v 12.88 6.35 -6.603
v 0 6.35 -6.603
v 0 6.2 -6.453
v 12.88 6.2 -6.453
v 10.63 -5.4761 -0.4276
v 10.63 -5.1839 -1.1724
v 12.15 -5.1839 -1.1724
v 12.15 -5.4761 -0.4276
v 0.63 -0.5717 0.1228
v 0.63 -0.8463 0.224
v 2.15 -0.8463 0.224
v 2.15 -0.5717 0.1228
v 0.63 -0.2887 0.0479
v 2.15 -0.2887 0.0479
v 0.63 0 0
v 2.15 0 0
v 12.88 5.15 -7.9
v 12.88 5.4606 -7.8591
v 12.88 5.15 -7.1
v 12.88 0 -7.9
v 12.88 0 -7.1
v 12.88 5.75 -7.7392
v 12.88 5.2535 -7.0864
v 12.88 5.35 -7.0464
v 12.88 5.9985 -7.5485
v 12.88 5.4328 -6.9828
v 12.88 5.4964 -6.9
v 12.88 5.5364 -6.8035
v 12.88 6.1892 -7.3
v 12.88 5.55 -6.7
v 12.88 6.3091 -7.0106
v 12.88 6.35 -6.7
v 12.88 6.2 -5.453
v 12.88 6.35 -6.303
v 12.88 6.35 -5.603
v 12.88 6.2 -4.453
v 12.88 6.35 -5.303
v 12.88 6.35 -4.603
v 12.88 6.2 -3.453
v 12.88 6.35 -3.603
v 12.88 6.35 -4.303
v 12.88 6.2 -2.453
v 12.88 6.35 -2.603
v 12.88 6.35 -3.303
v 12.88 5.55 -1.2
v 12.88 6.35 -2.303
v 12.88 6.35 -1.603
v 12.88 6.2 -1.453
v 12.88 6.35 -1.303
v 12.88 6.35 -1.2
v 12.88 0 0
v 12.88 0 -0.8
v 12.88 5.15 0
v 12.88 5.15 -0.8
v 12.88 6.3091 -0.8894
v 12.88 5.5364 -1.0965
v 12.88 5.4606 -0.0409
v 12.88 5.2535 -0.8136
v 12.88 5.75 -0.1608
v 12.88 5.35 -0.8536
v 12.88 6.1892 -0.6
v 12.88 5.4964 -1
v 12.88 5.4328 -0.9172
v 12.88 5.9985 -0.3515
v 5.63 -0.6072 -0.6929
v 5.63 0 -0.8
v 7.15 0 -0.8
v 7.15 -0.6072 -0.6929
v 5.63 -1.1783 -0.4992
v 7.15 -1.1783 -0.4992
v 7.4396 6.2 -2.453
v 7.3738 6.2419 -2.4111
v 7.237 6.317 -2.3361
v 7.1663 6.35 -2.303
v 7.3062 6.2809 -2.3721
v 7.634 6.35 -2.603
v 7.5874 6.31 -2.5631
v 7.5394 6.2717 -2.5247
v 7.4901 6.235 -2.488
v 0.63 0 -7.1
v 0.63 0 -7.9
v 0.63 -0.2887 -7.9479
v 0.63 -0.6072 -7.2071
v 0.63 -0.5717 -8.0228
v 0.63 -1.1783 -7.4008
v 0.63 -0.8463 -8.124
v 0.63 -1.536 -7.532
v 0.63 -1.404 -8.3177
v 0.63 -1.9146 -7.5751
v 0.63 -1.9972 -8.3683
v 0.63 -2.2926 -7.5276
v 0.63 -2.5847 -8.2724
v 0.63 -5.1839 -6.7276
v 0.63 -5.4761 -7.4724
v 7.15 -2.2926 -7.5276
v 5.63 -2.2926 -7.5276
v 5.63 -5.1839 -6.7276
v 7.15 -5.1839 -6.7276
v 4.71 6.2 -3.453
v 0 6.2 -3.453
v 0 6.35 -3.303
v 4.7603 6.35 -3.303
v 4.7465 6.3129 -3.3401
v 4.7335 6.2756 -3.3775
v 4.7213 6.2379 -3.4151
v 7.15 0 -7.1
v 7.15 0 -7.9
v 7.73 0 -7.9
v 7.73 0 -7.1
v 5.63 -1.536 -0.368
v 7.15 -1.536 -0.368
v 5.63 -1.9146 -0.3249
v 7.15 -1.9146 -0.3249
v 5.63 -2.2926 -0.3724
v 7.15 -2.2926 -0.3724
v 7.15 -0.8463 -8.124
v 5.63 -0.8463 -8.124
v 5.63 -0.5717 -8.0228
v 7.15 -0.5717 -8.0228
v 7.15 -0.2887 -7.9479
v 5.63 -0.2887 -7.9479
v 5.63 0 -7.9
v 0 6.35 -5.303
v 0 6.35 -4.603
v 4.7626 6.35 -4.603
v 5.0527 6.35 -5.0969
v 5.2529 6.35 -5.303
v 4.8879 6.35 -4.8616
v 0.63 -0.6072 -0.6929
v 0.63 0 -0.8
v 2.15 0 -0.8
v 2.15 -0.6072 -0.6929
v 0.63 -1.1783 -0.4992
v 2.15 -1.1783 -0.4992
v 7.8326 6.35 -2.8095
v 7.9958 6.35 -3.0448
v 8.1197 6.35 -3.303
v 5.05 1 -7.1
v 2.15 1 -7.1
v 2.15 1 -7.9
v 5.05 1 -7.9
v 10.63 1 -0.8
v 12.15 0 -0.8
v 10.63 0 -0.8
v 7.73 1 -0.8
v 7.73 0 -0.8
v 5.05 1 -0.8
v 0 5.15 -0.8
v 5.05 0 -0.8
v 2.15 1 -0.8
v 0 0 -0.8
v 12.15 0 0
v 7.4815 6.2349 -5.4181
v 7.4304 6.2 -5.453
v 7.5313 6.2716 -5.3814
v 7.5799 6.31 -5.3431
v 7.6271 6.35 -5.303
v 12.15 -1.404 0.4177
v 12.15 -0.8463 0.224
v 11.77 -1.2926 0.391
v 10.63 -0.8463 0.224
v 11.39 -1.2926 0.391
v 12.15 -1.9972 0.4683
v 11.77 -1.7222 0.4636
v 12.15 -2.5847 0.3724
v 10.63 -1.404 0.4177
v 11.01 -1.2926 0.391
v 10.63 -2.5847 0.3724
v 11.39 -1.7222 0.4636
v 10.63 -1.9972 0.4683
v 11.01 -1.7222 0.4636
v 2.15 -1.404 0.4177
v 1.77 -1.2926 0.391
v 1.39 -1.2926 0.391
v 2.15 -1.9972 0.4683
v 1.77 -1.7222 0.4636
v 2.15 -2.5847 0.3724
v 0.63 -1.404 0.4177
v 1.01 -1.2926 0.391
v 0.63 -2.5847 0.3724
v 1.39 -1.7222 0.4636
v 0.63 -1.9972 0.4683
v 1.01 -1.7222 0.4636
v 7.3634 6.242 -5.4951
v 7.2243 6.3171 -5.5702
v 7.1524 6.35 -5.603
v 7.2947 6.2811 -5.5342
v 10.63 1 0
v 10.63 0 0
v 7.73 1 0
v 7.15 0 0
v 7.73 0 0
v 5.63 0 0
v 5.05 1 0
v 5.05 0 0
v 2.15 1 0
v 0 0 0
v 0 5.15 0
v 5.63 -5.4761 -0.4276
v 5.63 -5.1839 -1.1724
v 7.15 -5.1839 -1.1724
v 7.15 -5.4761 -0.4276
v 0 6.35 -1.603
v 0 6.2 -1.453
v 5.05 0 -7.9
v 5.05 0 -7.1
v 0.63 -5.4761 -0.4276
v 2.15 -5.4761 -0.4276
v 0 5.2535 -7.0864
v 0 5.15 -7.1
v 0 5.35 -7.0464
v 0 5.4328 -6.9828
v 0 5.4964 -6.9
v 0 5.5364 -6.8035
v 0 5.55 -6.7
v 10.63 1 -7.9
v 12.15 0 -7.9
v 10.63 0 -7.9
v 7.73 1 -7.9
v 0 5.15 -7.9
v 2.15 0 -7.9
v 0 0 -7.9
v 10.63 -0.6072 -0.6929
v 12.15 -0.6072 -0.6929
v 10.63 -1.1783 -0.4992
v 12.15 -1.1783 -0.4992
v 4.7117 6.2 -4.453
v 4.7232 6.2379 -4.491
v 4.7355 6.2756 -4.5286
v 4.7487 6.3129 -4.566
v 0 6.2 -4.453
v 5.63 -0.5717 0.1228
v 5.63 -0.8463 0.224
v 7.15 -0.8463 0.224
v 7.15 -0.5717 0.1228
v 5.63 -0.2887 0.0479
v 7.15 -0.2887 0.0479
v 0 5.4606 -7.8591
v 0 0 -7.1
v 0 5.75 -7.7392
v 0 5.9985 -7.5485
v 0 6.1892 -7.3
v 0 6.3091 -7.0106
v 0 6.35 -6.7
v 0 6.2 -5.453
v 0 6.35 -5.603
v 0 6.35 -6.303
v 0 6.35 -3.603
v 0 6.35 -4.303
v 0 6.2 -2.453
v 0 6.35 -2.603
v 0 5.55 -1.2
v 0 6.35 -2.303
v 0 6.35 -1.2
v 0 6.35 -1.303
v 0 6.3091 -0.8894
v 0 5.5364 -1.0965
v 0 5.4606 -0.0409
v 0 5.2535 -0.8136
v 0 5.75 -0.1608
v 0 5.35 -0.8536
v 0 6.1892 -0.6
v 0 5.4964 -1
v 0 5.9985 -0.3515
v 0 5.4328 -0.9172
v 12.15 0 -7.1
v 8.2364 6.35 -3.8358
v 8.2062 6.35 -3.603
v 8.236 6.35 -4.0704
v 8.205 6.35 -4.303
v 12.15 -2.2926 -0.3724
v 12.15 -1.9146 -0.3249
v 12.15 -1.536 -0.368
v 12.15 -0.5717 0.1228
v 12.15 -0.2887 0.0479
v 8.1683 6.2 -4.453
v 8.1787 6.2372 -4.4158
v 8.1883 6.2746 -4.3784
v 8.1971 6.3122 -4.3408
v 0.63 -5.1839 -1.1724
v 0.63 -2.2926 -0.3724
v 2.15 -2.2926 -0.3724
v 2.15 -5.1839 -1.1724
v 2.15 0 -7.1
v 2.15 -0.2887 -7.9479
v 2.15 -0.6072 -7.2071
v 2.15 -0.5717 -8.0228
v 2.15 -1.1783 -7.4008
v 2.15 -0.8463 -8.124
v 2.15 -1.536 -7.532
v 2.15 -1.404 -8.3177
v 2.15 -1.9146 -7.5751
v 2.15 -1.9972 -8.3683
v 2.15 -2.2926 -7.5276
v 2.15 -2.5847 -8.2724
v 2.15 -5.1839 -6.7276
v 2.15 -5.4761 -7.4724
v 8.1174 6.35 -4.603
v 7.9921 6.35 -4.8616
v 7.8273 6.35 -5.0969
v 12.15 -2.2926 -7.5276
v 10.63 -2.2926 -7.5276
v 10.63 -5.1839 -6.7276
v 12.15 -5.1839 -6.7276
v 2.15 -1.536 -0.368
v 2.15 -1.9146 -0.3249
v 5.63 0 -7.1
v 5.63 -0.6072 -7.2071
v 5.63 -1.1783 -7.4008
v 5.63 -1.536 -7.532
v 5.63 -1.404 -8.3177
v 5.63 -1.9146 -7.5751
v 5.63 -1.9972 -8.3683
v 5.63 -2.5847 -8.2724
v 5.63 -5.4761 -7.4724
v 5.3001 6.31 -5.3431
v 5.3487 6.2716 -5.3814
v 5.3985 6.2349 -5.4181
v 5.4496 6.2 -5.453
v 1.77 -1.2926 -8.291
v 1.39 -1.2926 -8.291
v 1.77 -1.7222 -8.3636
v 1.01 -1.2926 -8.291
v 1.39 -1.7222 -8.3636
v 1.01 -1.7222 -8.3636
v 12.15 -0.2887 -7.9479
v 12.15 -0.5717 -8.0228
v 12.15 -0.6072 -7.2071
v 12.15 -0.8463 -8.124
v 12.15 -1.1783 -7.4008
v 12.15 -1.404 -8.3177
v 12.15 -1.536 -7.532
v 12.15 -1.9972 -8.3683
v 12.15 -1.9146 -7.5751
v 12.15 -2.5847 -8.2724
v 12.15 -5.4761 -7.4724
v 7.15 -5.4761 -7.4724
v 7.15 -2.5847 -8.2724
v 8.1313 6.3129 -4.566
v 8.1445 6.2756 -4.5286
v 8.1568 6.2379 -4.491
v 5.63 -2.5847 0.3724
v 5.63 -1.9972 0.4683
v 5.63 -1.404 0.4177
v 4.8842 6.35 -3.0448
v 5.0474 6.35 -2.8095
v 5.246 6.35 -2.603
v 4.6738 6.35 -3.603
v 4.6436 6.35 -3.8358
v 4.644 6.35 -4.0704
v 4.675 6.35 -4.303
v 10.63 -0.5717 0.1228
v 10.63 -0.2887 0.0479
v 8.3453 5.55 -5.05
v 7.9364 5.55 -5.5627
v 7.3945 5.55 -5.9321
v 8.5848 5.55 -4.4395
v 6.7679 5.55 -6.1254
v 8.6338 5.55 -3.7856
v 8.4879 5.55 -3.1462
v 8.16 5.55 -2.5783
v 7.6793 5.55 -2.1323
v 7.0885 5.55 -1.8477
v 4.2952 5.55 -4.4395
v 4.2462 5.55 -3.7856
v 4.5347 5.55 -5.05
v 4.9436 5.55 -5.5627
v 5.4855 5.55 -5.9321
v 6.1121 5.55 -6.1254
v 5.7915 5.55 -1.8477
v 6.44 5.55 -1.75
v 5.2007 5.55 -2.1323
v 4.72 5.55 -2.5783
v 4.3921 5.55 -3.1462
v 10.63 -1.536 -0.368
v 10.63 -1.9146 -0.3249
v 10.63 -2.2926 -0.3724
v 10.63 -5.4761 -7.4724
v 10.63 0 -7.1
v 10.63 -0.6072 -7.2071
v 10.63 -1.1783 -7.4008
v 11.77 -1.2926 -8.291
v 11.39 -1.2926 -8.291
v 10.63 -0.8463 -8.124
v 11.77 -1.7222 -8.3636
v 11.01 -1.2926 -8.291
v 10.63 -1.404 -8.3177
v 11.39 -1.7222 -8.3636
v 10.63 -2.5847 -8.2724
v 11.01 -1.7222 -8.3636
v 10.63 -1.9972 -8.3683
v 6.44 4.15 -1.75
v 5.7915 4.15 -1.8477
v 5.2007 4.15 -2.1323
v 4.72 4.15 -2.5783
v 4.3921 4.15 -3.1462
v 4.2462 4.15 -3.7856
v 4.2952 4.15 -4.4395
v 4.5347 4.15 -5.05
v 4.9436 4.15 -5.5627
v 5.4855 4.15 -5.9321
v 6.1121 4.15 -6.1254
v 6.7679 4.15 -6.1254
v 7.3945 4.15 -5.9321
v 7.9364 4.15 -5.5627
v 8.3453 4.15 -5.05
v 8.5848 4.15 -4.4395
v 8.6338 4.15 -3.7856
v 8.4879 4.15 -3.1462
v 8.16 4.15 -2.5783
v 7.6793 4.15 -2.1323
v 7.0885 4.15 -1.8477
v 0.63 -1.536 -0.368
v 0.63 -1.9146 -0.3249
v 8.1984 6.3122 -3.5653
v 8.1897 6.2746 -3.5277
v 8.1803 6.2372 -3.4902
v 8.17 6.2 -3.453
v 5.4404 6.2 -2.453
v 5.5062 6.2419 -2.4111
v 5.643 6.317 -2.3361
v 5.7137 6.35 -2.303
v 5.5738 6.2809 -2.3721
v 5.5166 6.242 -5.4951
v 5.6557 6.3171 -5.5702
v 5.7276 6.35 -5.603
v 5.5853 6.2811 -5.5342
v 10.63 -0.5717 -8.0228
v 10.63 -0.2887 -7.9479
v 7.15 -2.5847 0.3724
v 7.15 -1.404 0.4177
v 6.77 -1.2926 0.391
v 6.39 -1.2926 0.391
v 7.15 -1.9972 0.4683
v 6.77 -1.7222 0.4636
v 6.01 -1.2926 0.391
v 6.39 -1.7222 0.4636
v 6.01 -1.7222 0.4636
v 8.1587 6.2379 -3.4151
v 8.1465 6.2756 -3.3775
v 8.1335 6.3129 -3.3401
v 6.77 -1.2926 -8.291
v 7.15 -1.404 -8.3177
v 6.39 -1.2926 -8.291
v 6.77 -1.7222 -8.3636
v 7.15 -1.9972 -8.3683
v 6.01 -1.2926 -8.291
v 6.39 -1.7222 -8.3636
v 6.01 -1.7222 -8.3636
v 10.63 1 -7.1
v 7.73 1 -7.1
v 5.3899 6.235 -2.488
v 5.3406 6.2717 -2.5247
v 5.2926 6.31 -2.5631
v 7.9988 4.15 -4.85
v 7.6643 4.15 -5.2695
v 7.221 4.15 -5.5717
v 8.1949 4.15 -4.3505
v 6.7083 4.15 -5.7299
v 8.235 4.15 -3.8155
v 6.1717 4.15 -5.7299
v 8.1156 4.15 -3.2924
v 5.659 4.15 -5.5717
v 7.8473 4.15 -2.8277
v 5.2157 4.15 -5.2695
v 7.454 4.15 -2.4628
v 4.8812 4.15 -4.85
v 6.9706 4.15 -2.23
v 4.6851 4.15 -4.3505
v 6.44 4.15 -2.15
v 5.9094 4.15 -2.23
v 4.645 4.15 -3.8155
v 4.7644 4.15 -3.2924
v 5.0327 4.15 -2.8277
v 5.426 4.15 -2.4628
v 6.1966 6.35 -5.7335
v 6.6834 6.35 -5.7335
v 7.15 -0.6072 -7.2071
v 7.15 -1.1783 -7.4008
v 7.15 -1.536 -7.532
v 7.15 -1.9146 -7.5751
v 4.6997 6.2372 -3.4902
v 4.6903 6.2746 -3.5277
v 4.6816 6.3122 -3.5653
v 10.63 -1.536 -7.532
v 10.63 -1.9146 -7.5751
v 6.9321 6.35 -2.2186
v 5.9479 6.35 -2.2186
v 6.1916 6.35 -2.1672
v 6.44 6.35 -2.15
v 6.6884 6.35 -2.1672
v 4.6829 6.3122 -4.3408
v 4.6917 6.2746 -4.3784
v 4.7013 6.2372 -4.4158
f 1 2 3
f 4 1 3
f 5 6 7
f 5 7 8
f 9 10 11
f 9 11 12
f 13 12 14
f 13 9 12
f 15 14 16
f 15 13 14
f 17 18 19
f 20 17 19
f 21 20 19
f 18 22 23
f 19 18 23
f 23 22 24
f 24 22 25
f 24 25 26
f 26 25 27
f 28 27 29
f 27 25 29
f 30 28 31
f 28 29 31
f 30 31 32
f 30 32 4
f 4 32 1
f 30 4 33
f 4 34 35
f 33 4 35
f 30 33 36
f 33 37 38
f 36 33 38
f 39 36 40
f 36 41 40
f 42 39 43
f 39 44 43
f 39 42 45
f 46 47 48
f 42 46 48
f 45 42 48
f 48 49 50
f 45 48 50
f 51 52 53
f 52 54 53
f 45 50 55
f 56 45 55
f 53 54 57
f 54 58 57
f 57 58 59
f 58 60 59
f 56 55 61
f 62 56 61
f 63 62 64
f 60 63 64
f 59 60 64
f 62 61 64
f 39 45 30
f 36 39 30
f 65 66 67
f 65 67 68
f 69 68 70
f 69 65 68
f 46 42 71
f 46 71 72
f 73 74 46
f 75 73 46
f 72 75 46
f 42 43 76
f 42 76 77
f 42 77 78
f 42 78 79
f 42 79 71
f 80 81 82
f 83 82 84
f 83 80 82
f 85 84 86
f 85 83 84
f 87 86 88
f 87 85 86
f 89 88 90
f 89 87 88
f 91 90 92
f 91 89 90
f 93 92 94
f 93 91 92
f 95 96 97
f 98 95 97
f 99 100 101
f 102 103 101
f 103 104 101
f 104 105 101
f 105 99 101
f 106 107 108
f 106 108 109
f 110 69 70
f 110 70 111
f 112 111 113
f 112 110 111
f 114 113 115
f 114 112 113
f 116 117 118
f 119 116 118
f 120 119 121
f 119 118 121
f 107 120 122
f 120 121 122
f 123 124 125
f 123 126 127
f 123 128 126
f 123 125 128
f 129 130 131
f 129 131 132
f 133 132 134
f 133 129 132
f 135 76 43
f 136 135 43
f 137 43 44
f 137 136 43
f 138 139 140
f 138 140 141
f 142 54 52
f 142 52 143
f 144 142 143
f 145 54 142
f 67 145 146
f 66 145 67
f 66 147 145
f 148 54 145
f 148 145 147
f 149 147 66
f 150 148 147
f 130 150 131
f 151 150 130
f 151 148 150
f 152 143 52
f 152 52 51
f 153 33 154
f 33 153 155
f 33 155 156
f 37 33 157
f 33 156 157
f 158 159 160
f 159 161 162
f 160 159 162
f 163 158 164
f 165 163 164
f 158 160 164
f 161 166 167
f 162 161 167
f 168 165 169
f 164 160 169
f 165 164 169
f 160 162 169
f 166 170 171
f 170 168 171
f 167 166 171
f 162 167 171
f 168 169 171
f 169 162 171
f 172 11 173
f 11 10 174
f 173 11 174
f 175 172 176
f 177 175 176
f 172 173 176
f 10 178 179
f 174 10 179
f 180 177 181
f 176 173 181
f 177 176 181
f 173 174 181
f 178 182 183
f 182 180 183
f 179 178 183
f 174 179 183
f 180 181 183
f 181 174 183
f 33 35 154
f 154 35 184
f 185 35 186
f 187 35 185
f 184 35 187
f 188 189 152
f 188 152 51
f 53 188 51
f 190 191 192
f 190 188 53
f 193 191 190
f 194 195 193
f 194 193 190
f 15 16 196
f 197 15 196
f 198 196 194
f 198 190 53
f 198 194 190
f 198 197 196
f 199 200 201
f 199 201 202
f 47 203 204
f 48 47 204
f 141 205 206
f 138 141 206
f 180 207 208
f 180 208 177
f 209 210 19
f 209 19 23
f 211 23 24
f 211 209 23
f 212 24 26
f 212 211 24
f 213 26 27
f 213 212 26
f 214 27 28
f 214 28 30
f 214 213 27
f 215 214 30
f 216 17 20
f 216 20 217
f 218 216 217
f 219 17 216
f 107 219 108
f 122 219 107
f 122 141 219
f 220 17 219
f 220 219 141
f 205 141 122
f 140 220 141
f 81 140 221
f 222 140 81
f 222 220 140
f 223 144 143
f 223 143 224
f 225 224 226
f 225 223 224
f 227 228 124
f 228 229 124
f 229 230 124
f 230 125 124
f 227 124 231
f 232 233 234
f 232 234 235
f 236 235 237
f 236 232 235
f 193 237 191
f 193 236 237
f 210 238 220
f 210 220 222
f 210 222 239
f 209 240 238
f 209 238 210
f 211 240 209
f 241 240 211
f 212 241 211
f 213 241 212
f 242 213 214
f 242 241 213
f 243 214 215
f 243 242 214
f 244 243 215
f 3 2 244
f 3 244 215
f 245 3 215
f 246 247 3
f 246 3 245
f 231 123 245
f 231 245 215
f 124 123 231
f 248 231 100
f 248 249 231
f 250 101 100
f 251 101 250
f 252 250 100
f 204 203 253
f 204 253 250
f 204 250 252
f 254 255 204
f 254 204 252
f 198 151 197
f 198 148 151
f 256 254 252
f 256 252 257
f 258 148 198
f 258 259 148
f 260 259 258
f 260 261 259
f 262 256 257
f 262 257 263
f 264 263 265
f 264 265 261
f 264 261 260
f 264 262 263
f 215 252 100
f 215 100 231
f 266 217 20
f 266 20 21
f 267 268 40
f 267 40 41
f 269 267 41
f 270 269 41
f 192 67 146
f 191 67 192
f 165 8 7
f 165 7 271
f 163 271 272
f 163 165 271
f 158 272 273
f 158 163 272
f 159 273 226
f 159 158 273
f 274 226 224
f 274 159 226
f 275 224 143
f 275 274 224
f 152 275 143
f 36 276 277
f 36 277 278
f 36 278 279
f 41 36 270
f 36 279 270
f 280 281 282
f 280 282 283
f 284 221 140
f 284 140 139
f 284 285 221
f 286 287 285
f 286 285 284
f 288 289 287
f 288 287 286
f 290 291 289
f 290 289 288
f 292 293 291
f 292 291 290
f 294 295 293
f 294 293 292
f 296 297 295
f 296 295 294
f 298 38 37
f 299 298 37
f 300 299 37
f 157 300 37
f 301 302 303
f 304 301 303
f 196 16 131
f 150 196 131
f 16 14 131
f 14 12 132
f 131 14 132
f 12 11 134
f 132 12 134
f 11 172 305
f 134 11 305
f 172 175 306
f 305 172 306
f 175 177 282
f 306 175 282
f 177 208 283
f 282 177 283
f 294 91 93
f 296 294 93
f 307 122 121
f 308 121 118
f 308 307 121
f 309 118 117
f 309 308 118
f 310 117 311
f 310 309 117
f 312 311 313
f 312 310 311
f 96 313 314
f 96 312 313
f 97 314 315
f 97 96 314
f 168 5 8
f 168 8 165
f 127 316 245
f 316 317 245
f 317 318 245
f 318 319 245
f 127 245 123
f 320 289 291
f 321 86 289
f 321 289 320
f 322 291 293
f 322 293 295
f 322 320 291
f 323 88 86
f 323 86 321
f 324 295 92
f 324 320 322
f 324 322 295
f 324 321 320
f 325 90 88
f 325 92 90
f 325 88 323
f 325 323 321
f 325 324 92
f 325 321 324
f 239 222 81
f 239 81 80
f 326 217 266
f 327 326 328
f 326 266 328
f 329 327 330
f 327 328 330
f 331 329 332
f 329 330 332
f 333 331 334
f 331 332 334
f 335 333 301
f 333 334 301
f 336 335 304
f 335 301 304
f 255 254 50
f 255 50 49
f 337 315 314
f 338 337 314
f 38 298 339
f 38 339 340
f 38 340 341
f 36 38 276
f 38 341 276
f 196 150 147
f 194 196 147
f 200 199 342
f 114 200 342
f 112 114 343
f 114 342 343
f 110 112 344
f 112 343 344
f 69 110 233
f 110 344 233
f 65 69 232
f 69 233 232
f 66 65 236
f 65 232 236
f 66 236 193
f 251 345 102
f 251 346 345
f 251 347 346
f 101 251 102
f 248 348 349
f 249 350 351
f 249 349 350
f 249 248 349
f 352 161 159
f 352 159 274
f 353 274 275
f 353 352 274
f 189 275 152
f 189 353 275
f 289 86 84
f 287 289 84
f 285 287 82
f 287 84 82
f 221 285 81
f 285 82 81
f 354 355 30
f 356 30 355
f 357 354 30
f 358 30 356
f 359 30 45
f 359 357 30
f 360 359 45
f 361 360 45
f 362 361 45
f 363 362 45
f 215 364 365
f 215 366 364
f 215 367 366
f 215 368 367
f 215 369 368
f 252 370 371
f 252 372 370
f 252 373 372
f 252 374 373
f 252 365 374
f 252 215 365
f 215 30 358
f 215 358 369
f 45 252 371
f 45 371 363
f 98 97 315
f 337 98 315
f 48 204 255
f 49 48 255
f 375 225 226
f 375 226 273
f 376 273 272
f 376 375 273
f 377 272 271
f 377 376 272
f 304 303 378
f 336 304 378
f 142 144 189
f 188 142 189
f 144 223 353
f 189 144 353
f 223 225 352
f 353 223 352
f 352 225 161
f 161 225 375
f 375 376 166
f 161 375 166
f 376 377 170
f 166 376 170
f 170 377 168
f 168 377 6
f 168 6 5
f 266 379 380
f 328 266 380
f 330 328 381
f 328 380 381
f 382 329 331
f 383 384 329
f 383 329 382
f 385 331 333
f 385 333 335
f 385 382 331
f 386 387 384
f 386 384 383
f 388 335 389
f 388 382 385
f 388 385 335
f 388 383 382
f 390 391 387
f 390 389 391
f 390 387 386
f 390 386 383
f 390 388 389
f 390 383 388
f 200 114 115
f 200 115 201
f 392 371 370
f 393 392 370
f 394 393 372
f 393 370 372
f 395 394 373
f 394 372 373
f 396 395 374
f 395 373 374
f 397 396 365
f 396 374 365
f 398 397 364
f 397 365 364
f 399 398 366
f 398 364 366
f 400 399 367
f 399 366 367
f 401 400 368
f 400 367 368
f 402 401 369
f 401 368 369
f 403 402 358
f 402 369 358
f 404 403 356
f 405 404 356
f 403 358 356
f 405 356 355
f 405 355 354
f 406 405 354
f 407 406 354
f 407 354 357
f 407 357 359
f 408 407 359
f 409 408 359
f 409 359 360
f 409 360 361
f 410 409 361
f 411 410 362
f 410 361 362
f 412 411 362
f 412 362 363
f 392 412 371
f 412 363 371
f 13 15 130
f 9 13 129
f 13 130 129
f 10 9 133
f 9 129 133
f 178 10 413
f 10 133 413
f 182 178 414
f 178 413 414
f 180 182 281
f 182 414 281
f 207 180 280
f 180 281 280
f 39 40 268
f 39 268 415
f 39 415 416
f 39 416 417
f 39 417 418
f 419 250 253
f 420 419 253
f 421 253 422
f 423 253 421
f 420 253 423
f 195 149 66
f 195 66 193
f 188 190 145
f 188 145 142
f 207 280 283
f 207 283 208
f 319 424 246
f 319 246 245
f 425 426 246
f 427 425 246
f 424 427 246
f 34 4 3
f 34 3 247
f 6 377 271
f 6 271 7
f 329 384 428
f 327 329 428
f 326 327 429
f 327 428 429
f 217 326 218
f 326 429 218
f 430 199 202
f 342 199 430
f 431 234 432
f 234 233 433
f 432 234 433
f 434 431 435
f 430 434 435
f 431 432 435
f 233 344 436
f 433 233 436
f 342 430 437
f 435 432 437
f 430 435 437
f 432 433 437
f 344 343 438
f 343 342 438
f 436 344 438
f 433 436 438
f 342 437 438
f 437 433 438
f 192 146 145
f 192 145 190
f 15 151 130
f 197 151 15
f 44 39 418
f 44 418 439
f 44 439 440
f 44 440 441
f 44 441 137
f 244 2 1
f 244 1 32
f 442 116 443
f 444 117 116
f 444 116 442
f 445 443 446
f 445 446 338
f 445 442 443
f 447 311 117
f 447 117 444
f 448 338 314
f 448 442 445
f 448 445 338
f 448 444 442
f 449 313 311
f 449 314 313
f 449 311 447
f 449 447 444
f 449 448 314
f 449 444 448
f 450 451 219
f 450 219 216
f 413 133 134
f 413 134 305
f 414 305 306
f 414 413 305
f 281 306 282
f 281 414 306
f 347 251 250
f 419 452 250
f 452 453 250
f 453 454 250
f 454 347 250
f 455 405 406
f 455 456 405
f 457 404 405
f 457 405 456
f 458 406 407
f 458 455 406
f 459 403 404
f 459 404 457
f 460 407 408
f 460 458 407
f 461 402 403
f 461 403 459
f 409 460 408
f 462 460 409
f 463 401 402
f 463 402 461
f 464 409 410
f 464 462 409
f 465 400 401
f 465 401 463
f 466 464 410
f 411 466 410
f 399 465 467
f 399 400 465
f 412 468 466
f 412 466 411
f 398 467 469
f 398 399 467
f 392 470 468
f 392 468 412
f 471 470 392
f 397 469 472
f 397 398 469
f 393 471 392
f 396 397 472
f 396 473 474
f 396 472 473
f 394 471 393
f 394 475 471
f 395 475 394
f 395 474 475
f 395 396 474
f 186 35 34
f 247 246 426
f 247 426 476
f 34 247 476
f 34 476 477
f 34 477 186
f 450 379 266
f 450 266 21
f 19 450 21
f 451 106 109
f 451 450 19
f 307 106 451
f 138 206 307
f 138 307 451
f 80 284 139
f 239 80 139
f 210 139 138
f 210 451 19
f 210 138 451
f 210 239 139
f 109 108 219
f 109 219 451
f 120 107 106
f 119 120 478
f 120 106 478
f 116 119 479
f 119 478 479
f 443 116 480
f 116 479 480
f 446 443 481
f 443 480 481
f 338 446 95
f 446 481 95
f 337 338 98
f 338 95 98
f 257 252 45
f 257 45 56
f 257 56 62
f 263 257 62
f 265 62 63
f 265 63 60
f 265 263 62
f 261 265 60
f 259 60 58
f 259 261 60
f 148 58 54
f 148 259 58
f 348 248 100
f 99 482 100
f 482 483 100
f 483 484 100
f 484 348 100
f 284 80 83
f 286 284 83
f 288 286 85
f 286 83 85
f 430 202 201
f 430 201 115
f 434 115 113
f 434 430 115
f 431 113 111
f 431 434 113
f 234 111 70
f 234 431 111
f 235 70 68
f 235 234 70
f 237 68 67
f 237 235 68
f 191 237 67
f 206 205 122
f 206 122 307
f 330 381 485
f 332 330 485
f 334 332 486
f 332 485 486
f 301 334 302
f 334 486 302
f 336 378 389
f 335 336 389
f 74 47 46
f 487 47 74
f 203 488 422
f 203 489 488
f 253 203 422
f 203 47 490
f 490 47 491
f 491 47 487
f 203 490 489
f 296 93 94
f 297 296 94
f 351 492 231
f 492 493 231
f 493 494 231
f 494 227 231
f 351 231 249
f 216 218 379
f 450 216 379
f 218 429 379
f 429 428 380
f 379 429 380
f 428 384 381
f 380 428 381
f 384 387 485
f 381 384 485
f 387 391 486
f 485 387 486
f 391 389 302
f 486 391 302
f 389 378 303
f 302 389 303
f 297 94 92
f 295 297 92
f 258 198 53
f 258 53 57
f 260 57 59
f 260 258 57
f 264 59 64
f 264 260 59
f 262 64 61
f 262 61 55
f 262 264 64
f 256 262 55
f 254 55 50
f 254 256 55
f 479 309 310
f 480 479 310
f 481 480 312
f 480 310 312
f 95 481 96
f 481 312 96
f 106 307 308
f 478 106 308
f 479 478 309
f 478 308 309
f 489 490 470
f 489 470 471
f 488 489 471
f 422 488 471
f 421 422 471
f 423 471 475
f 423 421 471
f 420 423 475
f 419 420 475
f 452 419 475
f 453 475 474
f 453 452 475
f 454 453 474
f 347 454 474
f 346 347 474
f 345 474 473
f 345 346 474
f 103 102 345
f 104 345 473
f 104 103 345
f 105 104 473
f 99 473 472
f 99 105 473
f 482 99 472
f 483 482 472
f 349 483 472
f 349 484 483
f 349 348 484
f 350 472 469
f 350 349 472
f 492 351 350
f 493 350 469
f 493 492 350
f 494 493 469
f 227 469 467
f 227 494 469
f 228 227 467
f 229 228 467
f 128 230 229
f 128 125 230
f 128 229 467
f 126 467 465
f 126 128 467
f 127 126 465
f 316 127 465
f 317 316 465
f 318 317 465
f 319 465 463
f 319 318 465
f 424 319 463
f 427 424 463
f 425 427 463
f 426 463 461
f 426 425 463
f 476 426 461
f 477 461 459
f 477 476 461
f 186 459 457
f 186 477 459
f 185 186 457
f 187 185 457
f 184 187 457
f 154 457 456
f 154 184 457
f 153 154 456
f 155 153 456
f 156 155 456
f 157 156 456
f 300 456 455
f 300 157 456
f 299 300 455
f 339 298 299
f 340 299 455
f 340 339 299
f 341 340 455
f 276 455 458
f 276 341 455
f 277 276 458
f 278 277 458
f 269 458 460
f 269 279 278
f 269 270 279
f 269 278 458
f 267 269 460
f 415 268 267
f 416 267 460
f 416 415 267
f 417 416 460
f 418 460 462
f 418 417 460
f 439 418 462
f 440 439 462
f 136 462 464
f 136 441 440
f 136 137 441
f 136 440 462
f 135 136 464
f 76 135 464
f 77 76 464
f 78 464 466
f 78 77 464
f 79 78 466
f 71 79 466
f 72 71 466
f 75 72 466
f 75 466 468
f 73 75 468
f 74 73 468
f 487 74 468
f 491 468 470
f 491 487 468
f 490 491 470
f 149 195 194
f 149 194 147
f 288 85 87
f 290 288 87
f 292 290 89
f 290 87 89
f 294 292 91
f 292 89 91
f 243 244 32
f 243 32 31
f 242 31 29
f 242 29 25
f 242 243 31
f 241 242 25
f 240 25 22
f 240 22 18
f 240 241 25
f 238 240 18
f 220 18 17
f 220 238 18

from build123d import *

# Parameters (mm, degrees)
BOSS_EXTRUDE1_DEPTH     = 12.88
SWEEP1_START            = 0.63
SWEEP1_DEPTH            = 1.52
LPATTERN1_COUNT         = 3
LPATTERN1_PITCH         = 5
SKETCH5_W               = 2.9
SKETCH5_H               = 0.8
CUT_EXTRUDE1_DEPTH      = 1
LPATTERN2_COUNT         = 2
LPATTERN2_PITCH         = 5.58
MIRROR1_START           = 0.63
MIRROR1_COPY_1_DEPTH    = 1.52
MIRROR1_COPY_2_DEPTH    = 1.52
MIRROR1_COPY_3_SKETCH_W = 2.9
MIRROR1_COPY_3_SKETCH_H = 0.8
MIRROR1_COPY_3_DEPTH    = 1
CUT_EXTRUDE2_REACH      = 21.386
SKETCH6_R               = 1.8
SKETCH7_R               = 2.2
SKETCH7_R_2             = 1.8
BOSS_EXTRUDE2_DEPTH     = 1.4
CUT_EXTRUDE3_DEPTH      = 17.621667755


# Read off the part's stored shape, not the designer's step: Sweep1
with BuildPart() as part:
    # Sketch1 → Boss-Extrude1 (new body)
    with BuildSketch(Plane(origin=(0, 0, 0), x_dir=(0, 0, -1), z_dir=(1, 0, 0))):
        with BuildLine():
            Line((0, 0), (0, 5.15))
            ThreePointArc((0, 5.15), (0.351471863, 5.998528137), (1.2, 6.35))
            Line((1.2, 6.35), (6.7, 6.35))
            ThreePointArc((6.7, 6.35), (7.548528137, 5.998528137), (7.9, 5.15))
            Line((7.9, 5.15), (7.9, 0))
            Line((7.9, 0), (7.1, 0))
            Line((7.1, 0), (7.1, 5.15))
            ThreePointArc((7.1, 5.15), (6.982842712, 5.432842712), (6.7, 5.55))
            Line((6.7, 5.55), (1.2, 5.55))
            ThreePointArc((1.2, 5.55), (0.917157288, 5.432842712), (0.8, 5.15))
            Line((0.8, 5.15), (0.8, 0))
            Line((0.8, 0), (0, 0))
        make_face()
    extrude(amount=BOSS_EXTRUDE1_DEPTH)

    # Sweep1 outline → Sweep1 (add)
    with BuildSketch(Plane.YZ.offset(SWEEP1_START)):
        with BuildLine():
            add(Edge.make_bspline(
                [(-0.846283759, -8.124029358), (-0.858016898, -8.129757785), (-0.870152204, -8.135642842), (-1.003345202, -8.19967658), (-1.15196737, -8.253874655), (-1.433217357, -8.328196696), (-1.577221625, -8.352525408), (-2.012213537, -8.385830326), (-2.305250753, -8.352541538), (-2.584692284, -8.272379972)],
                knots=[-0.008659355, -0.008659355, -0.008659355, -0.008659355, 0, 0, 0.081660017, 0.081660017, 0.163320034, 0.163320034, 0.326640068, 0.326640068, 0.326640068, 0.326640068], degree=3))
            ThreePointArc((-0.846283759, -8.124029358), (-0.431086788, -7.982015265), (0, -7.9))
            Line((0, -7.9), (0, -7.1))
            add(Edge.make_bspline(
                [(0, -7.1), (-0.377073857, -7.135252748), (-0.796992874, -7.239007705), (-1.153651992, -7.390208706), (-1.166116228, -7.395524363), (-1.178338095, -7.400759688)],
                knots=[0, 0, 0, 0, 1, 1, 1.037382886, 1.037382886, 1.037382886, 1.037382886], degree=3))
            ThreePointArc((-1.178338095, -7.400759688), (-1.724000867, -7.564826814), (-2.292574798, -7.527620028))
            Line((-2.292574798, -7.527620028), (-5.183941257, -6.727620028))
            Line((-5.183941257, -6.727620028), (-5.476058743, -7.472379972))
            Line((-5.476058743, -7.472379972), (-2.584692284, -8.272379972))
        make_face()
    sweep1 = extrude(amount=SWEEP1_DEPTH)

    # LPattern1: Sweep1 ×3
    with Locations(*[(i * LPATTERN1_PITCH, 0, 0) for i in range(1, LPATTERN1_COUNT)]):
        add(sweep1)

    # Sketch5 → Cut-Extrude1 (cut)
    with BuildSketch(Plane.XZ):
        with Locations((3.6, -7.5)):
            Rectangle(SKETCH5_W, SKETCH5_H)
    cut_extrude1 = extrude(amount=-CUT_EXTRUDE1_DEPTH, mode=Mode.SUBTRACT)

    # LPattern2: Cut-Extrude1 ×2
    with Locations(*[(i * LPATTERN2_PITCH, 0, 0) for i in range(1, LPATTERN2_COUNT)]):
        add(cut_extrude1, mode=Mode.SUBTRACT)

    # Mirror1: Sweep1, Cut-Extrude1 across plane
    add(sweep1.mirror(Plane(origin=(0, 0, -3.95), x_dir=(1, 0, 0), z_dir=(0, 0, -1))))
    add(cut_extrude1.mirror(Plane(origin=(0, 0, -3.95), x_dir=(1, 0, 0), z_dir=(0, 0, -1))), mode=Mode.SUBTRACT)

    # Mirror1 copy 1 sketch → Mirror1 copy 1 (add)
    with BuildSketch(Plane(origin=(5, 0, -7.9), x_dir=(0, 1, 0), z_dir=(1, 0, 0)).offset(MIRROR1_START)):
        with BuildLine():
            add(Edge.make_bspline(
                [(-0.846283759, 8.124029358), (-0.858016898, 8.129757785), (-0.870152204, 8.135642842), (-1.003345202, 8.19967658), (-1.15196737, 8.253874655), (-1.433217357, 8.328196696), (-1.577221625, 8.352525408), (-2.012213537, 8.385830326), (-2.305250753, 8.352541538), (-2.584692284, 8.272379972)],
                knots=[-0.008659355, -0.008659355, -0.008659355, -0.008659355, 0, 0, 0.081660017, 0.081660017, 0.163320034, 0.163320034, 0.326640068, 0.326640068, 0.326640068, 0.326640068], degree=3))
            ThreePointArc((-0.846283759, 8.124029358), (-0.431086788, 7.982015265), (0, 7.9))
            Line((0, 7.9), (0, 7.1))
            add(Edge.make_bspline(
                [(0, 7.1), (-0.377073857, 7.135252748), (-0.796992874, 7.239007705), (-1.153651992, 7.390208706), (-1.166116228, 7.395524363), (-1.178338095, 7.400759688)],
                knots=[0, 0, 0, 0, 1, 1, 1.037382886, 1.037382886, 1.037382886, 1.037382886], degree=3))
            ThreePointArc((-1.178338095, 7.400759688), (-1.724000867, 7.564826814), (-2.292574798, 7.527620028))
            Line((-2.292574798, 7.527620028), (-5.183941257, 6.727620028))
            Line((-5.183941257, 6.727620028), (-5.476058743, 7.472379972))
            Line((-5.476058743, 7.472379972), (-2.584692284, 8.272379972))
        make_face()
    extrude(amount=MIRROR1_COPY_1_DEPTH)

    # Mirror1 copy 2 sketch → Mirror1 copy 2 (add)
    with BuildSketch(Plane(origin=(10, 0, -7.9), x_dir=(0, 1, 0), z_dir=(1, 0, 0)).offset(MIRROR1_START)):
        with BuildLine():
            add(Edge.make_bspline(
                [(-0.846283759, 8.124029358), (-0.858016898, 8.129757785), (-0.870152204, 8.135642842), (-1.003345202, 8.19967658), (-1.15196737, 8.253874655), (-1.433217357, 8.328196696), (-1.577221625, 8.352525408), (-2.012213537, 8.385830326), (-2.305250753, 8.352541538), (-2.584692284, 8.272379972)],
                knots=[-0.008659355, -0.008659355, -0.008659355, -0.008659355, 0, 0, 0.081660017, 0.081660017, 0.163320034, 0.163320034, 0.326640068, 0.326640068, 0.326640068, 0.326640068], degree=3))
            ThreePointArc((-0.846283759, 8.124029358), (-0.431086788, 7.982015265), (0, 7.9))
            Line((0, 7.9), (0, 7.1))
            add(Edge.make_bspline(
                [(0, 7.1), (-0.377073857, 7.135252748), (-0.796992874, 7.239007705), (-1.153651992, 7.390208706), (-1.166116228, 7.395524363), (-1.178338095, 7.400759688)],
                knots=[0, 0, 0, 0, 1, 1, 1.037382886, 1.037382886, 1.037382886, 1.037382886], degree=3))
            ThreePointArc((-1.178338095, 7.400759688), (-1.724000867, 7.564826814), (-2.292574798, 7.527620028))
            Line((-2.292574798, 7.527620028), (-5.183941257, 6.727620028))
            Line((-5.183941257, 6.727620028), (-5.476058743, 7.472379972))
            Line((-5.476058743, 7.472379972), (-2.584692284, 8.272379972))
        make_face()
    extrude(amount=MIRROR1_COPY_2_DEPTH)

    # Mirror1 copy 3 sketch → Mirror1 copy 3 (cut)
    with BuildSketch(Plane(origin=(5.58, 0, -7.9), x_dir=(1, 0, 0), z_dir=(0, -1, 0))):
        with Locations((3.6, 7.5)):
            Rectangle(MIRROR1_COPY_3_SKETCH_W, MIRROR1_COPY_3_SKETCH_H)
    extrude(amount=-MIRROR1_COPY_3_DEPTH, mode=Mode.SUBTRACT)

    # Sketch6 → Cut-Extrude2 (cut, up to next)
    with BuildSketch(Plane(origin=(0, 6.35, 0), x_dir=(1, 0, 0), z_dir=(0, 1, 0)), mode=Mode.PRIVATE) as cut_extrude2_sk1:
        with Locations(Location((6.44, 3.95, 0), (0, 0, 270))):
            Circle(SKETCH6_R)
    cut_extrude2_tool1 = extrude(cut_extrude2_sk1.sketch, amount=-CUT_EXTRUDE2_REACH, mode=Mode.PRIVATE) & part.part
    add(cut_extrude2_tool1.solids().sort_by_distance((6.44, 6.35, -3.95))[0], mode=Mode.SUBTRACT)

    # Sketch7 → Boss-Extrude2 (add)
    with BuildSketch(Plane.XZ.offset(-5.55)):
        with Locations(Location((6.44, -3.95, 0), (0, 0, 90))):
            Circle(SKETCH7_R)
        with Locations(Location((6.44, -3.95, 0), (0, 0, 90))):
            Circle(SKETCH7_R_2, mode=Mode.SUBTRACT)
    extrude(amount=BOSS_EXTRUDE2_DEPTH)

    # Sketch8 → Cut-Extrude3 (cut, through all)
    with BuildSketch(Plane.ZY):
        Polygon((-6.603043073, 6.35), (-6.453043073, 6.2), (-6.303043073, 6.35), align=None)
        Polygon((-5.303043073, 6.35), (-5.603043073, 6.35), (-5.453043073, 6.2), align=None)
        Polygon((-4.303043073, 6.35), (-4.603043073, 6.35), (-4.453043073, 6.2), align=None)
        Polygon((-3.303043073, 6.35), (-3.603043073, 6.35), (-3.453043073, 6.2), align=None)
        Polygon((-2.303043073, 6.35), (-2.603043073, 6.35), (-2.453043073, 6.2), align=None)
        Polygon((-1.303043073, 6.35), (-1.603043073, 6.35), (-1.453043073, 6.2), align=None)
    extrude(amount=-CUT_EXTRUDE3_DEPTH, mode=Mode.SUBTRACT)


solid = part.part
